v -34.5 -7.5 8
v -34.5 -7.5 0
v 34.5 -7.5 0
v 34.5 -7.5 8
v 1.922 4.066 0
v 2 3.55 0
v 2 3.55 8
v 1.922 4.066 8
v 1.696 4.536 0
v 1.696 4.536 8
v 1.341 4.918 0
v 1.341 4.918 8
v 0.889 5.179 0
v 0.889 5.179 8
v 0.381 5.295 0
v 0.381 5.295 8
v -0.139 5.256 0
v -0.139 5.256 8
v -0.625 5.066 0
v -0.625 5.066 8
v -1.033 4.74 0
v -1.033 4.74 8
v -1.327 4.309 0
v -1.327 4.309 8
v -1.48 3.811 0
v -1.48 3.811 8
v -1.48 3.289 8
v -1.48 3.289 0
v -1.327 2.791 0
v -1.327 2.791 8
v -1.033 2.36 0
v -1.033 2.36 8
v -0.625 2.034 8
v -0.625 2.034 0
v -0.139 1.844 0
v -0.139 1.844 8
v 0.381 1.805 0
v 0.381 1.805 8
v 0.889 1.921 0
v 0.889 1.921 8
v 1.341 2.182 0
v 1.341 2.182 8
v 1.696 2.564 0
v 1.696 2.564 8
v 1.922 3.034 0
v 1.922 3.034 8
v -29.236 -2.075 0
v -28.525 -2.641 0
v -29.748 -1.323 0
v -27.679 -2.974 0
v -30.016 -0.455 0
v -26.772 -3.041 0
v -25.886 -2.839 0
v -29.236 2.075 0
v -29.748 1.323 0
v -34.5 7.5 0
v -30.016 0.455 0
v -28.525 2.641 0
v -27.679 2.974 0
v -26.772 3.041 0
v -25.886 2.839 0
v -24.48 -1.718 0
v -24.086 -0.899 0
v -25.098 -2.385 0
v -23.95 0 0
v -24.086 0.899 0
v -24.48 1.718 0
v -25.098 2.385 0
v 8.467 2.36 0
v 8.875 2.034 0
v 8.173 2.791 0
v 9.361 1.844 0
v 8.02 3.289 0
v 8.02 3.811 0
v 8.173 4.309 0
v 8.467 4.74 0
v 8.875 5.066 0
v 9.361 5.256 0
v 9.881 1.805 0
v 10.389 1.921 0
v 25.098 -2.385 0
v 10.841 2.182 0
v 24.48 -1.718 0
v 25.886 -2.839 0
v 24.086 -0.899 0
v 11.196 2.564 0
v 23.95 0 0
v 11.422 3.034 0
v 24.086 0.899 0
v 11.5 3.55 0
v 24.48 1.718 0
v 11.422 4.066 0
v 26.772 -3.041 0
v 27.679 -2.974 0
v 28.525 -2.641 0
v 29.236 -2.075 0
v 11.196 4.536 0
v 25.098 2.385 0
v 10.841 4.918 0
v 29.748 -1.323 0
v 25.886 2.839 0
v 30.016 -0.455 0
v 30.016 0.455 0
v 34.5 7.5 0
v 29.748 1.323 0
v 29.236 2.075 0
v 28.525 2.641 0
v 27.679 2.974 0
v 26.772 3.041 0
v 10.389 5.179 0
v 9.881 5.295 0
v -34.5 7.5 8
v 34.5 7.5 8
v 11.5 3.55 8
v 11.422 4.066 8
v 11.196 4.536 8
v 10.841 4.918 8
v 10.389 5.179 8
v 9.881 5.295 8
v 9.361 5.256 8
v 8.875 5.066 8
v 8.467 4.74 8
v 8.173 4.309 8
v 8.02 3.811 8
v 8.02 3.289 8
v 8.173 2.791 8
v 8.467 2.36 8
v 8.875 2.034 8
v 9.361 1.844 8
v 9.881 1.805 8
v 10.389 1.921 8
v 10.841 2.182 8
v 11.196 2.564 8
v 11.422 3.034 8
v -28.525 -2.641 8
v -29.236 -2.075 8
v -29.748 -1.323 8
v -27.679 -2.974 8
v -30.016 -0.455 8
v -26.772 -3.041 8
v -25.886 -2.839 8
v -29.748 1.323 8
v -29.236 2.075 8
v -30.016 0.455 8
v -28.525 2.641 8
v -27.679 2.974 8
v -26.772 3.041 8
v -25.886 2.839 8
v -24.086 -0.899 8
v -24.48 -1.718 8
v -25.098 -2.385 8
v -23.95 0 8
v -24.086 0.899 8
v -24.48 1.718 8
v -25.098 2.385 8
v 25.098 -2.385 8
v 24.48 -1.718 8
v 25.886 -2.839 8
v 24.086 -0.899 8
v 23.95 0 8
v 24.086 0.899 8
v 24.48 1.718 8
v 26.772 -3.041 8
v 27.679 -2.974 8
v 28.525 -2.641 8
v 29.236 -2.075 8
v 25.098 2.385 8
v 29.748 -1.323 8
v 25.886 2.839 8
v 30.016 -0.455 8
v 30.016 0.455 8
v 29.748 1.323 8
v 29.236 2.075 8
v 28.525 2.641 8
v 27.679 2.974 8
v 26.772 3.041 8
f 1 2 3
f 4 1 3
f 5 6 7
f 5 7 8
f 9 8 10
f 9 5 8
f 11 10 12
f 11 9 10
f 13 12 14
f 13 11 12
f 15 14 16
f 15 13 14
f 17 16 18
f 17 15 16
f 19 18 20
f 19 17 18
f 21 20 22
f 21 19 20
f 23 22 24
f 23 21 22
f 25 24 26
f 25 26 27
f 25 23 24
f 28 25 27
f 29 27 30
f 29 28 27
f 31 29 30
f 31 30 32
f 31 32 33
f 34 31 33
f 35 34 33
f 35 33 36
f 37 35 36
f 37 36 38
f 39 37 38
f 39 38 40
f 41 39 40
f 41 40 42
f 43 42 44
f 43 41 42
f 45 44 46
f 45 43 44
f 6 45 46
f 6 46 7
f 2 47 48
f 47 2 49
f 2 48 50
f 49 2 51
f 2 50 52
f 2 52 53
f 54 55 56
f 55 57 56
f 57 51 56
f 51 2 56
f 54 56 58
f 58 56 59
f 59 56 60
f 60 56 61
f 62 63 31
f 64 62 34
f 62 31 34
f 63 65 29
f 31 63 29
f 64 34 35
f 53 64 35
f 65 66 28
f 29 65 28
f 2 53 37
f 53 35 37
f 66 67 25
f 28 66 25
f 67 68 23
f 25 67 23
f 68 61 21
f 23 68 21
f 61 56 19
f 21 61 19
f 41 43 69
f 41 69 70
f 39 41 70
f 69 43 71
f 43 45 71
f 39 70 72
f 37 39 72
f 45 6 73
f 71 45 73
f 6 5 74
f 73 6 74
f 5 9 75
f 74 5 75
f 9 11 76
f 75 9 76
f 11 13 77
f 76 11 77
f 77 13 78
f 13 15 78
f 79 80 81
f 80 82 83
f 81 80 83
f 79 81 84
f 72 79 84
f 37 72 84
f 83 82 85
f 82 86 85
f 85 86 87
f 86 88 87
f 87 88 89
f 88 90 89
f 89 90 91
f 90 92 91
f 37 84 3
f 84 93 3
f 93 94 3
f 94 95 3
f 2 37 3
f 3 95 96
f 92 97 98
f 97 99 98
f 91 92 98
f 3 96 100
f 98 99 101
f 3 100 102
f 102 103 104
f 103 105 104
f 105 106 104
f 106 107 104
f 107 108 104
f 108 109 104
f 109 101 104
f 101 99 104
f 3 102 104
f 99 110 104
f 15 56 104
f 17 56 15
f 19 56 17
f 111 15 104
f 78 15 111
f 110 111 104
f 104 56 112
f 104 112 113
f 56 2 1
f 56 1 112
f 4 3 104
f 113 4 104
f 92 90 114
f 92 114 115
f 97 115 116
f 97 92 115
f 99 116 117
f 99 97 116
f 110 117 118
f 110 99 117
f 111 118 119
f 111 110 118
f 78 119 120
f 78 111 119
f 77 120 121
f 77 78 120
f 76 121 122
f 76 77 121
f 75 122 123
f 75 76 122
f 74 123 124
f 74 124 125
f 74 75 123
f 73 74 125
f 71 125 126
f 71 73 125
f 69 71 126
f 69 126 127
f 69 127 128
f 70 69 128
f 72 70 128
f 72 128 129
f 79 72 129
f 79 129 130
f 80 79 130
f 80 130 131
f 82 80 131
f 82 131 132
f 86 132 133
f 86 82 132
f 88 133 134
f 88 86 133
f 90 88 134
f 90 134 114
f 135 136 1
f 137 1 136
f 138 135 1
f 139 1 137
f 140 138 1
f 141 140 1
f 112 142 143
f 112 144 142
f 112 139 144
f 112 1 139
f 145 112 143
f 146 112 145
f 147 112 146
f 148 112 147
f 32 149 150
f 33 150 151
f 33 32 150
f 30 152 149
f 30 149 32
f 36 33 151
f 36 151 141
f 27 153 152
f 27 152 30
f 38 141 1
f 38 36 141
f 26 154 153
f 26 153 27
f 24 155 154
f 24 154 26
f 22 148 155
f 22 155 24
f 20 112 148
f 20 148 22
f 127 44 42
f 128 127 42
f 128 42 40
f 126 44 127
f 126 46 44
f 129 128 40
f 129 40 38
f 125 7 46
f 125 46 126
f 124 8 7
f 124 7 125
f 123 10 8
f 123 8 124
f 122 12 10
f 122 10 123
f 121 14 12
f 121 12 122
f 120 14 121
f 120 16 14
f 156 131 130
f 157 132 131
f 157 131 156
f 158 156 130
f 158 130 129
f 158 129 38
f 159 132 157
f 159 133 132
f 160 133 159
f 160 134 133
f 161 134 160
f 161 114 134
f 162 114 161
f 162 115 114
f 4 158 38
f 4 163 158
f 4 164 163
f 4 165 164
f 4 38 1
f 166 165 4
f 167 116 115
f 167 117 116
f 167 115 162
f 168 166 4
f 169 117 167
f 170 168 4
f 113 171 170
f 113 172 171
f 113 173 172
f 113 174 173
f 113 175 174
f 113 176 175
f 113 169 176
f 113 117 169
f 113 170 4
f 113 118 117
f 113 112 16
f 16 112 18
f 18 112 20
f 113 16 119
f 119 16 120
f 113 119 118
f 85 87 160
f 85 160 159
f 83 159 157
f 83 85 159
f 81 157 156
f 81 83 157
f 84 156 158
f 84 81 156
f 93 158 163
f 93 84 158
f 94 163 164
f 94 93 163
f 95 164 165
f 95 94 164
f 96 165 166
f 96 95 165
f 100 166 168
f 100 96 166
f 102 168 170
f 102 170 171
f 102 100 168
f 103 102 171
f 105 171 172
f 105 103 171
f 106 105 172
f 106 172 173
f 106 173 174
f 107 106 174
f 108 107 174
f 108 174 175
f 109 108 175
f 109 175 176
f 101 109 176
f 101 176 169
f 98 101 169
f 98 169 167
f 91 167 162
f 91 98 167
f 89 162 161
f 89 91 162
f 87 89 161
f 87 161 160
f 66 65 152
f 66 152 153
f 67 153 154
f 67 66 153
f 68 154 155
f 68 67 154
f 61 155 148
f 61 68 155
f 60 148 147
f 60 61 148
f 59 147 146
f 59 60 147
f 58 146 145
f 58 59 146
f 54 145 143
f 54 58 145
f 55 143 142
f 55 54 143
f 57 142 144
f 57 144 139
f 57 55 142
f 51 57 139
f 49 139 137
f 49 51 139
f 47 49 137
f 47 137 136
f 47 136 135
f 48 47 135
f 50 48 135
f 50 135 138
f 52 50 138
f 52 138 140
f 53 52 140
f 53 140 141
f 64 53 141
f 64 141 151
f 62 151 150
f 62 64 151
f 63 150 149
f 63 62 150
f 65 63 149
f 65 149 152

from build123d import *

# Parameters (mm, degrees)
SKETCH1_W           = 69
SKETCH1_H           = 15
SKETCH1_R           = 3.05
SKETCH1_R_2         = 1.75
BOSS_EXTRUDE1_DEPTH = 8


with BuildPart() as part:
    # Sketch1 → Boss-Extrude1 (new body)
    with BuildSketch(Plane.XY):
        Rectangle(SKETCH1_W, SKETCH1_H)
        with Locations((-27, 0)):
            Circle(SKETCH1_R, mode=Mode.SUBTRACT)
        with Locations(Location((27, 0, 0), (0, 0, 180))):
            Circle(SKETCH1_R, mode=Mode.SUBTRACT)
        with Locations((0.25, 3.55)):
            Circle(SKETCH1_R_2, mode=Mode.SUBTRACT)
        with Locations((9.75, 3.55)):
            Circle(SKETCH1_R_2, mode=Mode.SUBTRACT)
    extrude(amount=BOSS_EXTRUDE1_DEPTH)


solid = part.part
